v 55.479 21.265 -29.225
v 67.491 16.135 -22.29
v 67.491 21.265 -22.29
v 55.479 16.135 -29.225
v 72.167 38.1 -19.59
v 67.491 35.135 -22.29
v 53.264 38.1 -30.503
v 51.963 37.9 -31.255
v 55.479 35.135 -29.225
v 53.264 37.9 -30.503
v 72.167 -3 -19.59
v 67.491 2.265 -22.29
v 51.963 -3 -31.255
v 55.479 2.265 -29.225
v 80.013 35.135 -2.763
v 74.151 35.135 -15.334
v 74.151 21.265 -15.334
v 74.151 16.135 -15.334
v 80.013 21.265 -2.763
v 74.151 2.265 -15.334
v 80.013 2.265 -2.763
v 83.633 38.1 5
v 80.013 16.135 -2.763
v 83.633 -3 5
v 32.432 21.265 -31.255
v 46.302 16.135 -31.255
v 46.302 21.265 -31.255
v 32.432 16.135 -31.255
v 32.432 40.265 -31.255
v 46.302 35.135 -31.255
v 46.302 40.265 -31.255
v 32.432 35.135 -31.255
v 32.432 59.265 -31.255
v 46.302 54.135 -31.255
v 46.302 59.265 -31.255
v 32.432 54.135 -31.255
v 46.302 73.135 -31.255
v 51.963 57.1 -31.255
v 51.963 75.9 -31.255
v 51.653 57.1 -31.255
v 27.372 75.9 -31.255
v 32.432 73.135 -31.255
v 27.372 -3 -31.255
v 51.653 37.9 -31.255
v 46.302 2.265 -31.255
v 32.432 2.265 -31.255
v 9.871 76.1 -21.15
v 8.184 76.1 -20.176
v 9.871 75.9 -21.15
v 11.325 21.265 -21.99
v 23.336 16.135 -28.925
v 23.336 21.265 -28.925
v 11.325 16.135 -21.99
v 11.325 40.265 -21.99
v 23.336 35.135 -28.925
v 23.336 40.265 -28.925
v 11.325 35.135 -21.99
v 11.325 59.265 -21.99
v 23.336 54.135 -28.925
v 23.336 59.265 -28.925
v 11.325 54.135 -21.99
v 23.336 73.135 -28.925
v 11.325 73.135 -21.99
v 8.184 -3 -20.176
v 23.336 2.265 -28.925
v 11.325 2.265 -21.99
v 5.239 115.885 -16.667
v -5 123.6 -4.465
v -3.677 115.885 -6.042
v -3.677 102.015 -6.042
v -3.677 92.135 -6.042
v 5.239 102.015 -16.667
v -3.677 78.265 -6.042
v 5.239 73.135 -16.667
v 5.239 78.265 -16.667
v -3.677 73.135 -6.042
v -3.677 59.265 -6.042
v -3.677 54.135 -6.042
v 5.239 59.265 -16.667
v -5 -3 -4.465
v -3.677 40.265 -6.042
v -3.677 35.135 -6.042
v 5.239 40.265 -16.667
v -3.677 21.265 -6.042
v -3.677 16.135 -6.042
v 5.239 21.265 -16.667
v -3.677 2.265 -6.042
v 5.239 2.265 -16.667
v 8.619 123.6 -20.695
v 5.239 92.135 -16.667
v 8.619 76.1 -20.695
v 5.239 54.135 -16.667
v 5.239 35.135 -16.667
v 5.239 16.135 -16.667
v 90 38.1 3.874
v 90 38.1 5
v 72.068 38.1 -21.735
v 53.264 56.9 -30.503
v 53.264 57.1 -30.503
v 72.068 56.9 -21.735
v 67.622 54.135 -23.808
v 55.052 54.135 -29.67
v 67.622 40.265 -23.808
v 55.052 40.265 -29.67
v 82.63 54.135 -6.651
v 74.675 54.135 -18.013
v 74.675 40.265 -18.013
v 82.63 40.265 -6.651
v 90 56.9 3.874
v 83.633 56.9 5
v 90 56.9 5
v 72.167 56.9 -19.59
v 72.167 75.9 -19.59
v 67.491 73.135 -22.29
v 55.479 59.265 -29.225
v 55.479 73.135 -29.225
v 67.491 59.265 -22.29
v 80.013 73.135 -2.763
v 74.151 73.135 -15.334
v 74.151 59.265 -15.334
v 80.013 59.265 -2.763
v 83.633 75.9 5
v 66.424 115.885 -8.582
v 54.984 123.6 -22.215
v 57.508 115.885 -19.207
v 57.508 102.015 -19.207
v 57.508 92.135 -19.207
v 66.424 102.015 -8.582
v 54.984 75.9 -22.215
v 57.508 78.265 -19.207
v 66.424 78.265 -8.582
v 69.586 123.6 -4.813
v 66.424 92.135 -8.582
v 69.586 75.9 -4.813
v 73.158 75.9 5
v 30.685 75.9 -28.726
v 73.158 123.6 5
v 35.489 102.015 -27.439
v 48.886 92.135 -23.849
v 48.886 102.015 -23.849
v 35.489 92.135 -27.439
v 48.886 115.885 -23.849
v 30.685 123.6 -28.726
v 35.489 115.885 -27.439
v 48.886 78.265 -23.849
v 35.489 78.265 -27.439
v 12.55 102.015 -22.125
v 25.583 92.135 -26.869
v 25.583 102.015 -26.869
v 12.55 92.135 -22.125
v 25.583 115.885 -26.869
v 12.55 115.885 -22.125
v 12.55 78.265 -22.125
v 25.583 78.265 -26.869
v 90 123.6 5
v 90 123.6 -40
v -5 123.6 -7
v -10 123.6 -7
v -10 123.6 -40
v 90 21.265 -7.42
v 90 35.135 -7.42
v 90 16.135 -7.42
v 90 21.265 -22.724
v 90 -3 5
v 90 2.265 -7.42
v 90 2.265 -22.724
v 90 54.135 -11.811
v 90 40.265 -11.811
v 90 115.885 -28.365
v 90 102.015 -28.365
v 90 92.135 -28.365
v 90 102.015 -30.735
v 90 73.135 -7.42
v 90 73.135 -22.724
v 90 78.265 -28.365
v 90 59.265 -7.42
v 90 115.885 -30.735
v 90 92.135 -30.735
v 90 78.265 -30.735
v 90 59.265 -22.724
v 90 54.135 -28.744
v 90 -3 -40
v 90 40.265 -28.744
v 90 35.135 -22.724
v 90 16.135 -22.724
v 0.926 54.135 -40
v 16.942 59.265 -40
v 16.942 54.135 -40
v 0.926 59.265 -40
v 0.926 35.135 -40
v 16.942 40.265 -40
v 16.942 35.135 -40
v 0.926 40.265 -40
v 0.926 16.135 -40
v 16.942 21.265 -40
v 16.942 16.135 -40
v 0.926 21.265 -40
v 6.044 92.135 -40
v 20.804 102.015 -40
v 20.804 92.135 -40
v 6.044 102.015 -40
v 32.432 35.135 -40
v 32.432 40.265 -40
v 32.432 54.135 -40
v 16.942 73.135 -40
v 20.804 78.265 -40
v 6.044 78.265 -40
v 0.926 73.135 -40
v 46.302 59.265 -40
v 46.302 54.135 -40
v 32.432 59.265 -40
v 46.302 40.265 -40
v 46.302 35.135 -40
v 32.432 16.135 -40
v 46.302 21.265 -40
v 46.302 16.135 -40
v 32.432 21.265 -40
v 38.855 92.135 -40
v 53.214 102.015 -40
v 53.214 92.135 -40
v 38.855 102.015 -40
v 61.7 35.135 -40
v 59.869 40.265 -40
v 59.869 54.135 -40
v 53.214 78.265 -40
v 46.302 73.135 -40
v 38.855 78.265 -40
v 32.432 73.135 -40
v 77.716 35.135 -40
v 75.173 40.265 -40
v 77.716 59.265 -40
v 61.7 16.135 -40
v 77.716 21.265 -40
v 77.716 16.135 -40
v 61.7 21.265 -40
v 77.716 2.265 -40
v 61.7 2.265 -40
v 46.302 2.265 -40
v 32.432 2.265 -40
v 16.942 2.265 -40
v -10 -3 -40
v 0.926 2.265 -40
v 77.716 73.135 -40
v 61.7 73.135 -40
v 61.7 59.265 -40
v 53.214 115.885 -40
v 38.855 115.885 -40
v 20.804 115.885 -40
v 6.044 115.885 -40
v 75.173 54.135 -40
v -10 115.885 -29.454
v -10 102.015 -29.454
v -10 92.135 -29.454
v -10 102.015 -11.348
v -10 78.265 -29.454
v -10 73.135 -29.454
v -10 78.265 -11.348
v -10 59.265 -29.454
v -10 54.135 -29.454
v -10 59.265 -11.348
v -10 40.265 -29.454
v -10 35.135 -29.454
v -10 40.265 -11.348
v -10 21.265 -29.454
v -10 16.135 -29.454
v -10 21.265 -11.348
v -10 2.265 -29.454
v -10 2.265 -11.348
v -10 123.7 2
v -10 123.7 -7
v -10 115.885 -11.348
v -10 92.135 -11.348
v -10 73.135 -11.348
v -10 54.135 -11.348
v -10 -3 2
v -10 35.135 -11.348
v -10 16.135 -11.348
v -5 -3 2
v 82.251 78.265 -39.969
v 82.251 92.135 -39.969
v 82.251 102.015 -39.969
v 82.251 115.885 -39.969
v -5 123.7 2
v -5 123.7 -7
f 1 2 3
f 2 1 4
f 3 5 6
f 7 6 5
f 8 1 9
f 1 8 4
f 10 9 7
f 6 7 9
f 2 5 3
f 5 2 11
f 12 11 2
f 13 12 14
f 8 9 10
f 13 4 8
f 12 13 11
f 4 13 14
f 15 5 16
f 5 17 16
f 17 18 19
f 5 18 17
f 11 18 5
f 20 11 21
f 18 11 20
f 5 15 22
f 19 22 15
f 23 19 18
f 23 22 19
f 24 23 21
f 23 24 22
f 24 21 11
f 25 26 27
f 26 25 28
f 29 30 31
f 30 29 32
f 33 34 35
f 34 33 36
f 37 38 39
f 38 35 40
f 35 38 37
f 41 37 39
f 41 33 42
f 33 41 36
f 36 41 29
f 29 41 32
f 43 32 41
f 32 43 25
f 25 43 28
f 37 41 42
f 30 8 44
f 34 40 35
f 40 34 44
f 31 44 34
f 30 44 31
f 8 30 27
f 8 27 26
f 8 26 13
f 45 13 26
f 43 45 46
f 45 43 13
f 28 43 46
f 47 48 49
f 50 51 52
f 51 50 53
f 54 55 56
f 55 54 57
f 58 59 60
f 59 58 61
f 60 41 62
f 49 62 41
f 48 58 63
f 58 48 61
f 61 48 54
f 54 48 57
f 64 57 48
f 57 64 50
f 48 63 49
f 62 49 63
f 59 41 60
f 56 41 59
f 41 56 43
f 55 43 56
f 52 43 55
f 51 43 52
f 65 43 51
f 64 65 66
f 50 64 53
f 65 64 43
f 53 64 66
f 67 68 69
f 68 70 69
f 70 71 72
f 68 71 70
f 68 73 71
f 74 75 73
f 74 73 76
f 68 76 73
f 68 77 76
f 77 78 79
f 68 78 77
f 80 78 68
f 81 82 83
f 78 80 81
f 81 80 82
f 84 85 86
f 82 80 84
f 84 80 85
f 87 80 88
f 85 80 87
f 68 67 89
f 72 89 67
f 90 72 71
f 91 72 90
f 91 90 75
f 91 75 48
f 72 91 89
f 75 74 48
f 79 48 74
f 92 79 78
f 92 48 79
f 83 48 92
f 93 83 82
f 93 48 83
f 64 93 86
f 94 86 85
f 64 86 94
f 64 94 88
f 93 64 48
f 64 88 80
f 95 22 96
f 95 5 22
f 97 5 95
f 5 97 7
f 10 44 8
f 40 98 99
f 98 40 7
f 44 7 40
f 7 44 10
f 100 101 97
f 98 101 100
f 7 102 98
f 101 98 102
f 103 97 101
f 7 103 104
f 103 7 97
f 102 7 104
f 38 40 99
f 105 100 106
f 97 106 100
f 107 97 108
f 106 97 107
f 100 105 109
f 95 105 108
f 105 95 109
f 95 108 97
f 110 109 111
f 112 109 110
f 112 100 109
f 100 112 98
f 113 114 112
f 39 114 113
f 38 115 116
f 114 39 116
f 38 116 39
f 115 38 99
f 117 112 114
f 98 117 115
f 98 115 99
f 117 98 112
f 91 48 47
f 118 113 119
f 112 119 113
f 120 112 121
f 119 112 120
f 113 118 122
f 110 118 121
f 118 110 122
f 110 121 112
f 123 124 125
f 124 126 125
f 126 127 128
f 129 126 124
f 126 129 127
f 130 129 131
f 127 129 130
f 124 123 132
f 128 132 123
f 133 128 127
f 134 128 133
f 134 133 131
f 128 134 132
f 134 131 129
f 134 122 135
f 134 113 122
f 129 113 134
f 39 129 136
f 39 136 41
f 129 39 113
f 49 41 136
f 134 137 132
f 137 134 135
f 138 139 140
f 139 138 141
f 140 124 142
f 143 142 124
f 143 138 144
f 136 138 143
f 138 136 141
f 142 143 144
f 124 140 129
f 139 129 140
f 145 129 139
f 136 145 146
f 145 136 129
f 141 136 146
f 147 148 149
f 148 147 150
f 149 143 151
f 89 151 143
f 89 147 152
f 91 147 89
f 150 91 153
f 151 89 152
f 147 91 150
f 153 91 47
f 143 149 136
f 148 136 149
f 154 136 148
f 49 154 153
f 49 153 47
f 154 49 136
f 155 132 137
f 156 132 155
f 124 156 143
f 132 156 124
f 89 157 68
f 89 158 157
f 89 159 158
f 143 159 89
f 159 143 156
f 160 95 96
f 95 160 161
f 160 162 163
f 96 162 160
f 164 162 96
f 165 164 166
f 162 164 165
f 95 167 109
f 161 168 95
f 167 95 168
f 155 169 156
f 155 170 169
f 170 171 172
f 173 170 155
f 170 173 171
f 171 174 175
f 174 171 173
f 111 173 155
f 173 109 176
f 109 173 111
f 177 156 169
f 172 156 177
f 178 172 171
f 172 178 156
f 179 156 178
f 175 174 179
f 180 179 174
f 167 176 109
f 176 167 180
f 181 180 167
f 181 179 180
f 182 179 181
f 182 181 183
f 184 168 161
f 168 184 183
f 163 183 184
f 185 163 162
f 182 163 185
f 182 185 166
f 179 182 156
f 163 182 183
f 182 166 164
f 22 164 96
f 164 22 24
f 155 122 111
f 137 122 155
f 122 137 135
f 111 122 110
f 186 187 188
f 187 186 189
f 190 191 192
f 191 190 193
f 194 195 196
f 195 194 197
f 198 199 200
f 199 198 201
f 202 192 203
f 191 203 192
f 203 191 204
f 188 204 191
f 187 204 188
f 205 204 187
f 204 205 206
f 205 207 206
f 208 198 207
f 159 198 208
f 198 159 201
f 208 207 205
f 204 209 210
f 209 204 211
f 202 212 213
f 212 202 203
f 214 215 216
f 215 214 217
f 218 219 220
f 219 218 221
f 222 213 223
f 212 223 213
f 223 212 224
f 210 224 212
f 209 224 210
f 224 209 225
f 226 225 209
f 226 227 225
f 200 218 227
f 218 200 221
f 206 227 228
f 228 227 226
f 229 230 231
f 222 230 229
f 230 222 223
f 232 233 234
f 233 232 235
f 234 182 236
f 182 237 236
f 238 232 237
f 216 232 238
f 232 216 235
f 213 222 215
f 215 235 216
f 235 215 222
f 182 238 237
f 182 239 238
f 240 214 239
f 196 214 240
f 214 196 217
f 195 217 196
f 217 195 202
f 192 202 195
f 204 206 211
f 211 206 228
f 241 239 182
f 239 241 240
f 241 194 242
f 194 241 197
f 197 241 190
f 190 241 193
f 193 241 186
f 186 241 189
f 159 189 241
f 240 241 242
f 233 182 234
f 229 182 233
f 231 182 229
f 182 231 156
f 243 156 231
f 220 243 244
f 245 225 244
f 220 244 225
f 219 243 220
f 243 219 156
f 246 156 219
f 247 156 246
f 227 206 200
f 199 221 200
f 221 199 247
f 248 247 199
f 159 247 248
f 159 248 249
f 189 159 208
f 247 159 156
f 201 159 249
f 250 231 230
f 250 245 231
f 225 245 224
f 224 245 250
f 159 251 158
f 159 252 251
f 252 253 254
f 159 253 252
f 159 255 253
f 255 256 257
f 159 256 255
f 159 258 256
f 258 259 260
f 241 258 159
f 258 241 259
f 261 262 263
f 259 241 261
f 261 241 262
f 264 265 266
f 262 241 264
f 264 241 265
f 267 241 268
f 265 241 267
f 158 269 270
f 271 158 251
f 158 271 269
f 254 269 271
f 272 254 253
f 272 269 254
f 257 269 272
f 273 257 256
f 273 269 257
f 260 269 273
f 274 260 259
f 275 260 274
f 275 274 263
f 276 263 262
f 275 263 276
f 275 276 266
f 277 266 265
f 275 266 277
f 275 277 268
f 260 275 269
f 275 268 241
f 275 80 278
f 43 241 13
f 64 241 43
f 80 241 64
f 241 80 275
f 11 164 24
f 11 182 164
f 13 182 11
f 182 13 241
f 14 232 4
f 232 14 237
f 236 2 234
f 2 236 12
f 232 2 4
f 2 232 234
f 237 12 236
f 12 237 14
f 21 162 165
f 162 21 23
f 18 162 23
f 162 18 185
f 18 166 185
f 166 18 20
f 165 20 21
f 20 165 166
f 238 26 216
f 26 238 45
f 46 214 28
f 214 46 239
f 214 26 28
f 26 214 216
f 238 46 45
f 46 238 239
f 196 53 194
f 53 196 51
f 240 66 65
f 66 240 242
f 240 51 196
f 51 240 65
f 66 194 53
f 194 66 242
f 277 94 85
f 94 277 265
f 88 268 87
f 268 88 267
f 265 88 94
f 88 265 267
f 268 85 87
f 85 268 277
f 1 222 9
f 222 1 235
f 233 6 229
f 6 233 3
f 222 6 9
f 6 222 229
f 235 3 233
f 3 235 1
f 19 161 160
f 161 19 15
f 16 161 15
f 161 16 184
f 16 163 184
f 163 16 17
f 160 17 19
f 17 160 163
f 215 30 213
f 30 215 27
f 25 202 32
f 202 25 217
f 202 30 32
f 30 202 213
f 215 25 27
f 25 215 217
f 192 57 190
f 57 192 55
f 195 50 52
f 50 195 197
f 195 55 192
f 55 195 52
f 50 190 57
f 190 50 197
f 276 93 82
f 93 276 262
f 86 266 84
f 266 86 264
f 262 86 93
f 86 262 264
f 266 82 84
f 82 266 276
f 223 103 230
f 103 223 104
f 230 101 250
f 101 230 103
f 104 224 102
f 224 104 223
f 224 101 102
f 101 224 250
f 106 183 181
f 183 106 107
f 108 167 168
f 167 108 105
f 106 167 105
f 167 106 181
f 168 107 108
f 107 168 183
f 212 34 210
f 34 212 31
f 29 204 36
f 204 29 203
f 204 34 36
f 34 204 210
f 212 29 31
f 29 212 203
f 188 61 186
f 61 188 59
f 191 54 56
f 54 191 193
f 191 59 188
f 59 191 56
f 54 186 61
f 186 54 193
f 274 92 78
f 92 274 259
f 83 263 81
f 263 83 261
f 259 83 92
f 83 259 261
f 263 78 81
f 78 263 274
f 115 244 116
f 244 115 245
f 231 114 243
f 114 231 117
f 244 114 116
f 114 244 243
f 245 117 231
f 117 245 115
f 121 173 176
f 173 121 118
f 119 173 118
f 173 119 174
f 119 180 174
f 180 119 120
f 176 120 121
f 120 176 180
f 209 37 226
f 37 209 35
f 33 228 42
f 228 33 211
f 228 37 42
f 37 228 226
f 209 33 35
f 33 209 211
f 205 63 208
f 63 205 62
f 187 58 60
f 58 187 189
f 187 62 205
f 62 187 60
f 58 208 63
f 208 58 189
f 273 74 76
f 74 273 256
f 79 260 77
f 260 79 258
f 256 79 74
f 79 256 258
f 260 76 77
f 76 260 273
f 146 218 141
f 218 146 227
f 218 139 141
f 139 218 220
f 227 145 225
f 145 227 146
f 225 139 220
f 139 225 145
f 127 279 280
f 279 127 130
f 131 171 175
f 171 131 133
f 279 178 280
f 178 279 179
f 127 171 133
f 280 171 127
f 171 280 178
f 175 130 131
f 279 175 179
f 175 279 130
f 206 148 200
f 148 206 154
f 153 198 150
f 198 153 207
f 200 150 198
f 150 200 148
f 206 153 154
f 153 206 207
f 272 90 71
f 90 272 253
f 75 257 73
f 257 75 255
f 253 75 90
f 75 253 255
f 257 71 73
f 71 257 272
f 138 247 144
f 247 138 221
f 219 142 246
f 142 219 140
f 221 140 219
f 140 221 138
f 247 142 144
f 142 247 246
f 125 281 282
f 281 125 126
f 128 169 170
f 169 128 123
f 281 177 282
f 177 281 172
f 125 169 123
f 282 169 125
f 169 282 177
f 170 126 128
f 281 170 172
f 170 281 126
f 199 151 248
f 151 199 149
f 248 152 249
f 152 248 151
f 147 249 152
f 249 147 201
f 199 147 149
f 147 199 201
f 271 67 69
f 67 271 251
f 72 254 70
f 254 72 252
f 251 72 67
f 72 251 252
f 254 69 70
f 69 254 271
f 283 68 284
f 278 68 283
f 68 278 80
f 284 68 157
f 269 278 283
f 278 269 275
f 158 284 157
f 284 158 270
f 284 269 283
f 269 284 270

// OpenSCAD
// file: column.scad
include <common.scad>;


module column_var_size(type, angles, offsets_x, offsets_z, width, enabled) {
    if (enabled[0]) {
        key(angles[0], type, width);
        if (enabled[1]) translate([SINGLE * cos(angles[0]) + offsets_x[0], 0, -SINGLE * sin(angles[0]) + offsets_z[0]]) {
            key(angles[1], type, width);
            if (enabled[2]) translate([SINGLE * cos(angles[1]) + offsets_x[1], 0, -SINGLE * sin(angles[1]) + offsets_z[1]]) {
                key(angles[2], type, width);
                if (enabled[3]) translate([SINGLE * cos(angles[2]) + offsets_x[2], 0, -SINGLE * sin(angles[2]) + offsets_z[2]]) {
                    key(angles[3], type, width);
                    if (enabled[4]) translate([SINGLE * cos(angles[3]) + offsets_x[3], 0, -SINGLE * sin(angles[3]) + offsets_z[3]]) {
                        key(angles[4], type, width);
                    }
                }
            }
        }
    }
}


module column5(type, angles, offsets_x, offsets_z, width=SINGLE) {
    column_var_size(type, angles, offsets_x, offsets_z, width, [true, true, true, true, true]);
}


module column4(type, angles, offsets_x, offsets_z, width=SINGLE) {
    column_var_size(type, angles, offsets_x, offsets_z, width, [true, true, true, true, false]);
}


module column3(type, angles, offsets_x, offsets_z, width=SINGLE) {
    column_var_size(type, angles, offsets_x, offsets_z, width, [true, true, true, false, false]);
}
// file: keycaps/dsa.scad
include <../common.scad>


// DSA keycap top width.
DSA_TOP_WIDTH = 12.7;
// DSA keycap height.
DSA_HEIGHT = 7.4;

USE_SIMPLIFIED_KEYS = true;


module key_base(type, width, is_simplified=USE_SIMPLIFIED_KEYS) {
    if (type == 0) {
        // A simple way to produce 1.5 and double horizontal keys.
        resize([KEY_WIDTH, KEY_WIDTH * width / SINGLE, DSA_HEIGHT]) {
            // Simplified geometry is much faster to render.
            if (is_simplified) {
                WN_OFFSET = (KEY_WIDTH - DSA_TOP_WIDTH) / 2;
                // Draw a keycap as a big bottom and a smaller top squares
                // connected by 4 side faces.
                // TODO: why do we use this translation?
                translate([WN_OFFSET, WN_OFFSET, 0]) {
                    // cube([DSA_TOP_WIDTH, DSA_TOP_WIDTH, DSA_HEIGHT]);
                    polyhedron(
                        points=[
                            // Bottom
                            [0, 0, 0],
                            [KEY_WIDTH, 0, 0],
                            [KEY_WIDTH, KEY_WIDTH, 0],
                            [0, KEY_WIDTH, 0],
                            // Top
                            [WN_OFFSET, WN_OFFSET, DSA_HEIGHT],
                            [WN_OFFSET + DSA_TOP_WIDTH, WN_OFFSET, DSA_HEIGHT],
                            [WN_OFFSET + DSA_TOP_WIDTH, WN_OFFSET + DSA_TOP_WIDTH, DSA_HEIGHT],
                            [WN_OFFSET, WN_OFFSET + DSA_TOP_WIDTH, DSA_HEIGHT],
                        ],
                        faces=[
                            // Bottom
                            [0, 1, 2],
                            [2, 3, 0],
                            // Top
                            [5, 4, 6],
                            [6, 4, 7],
                            // Sides
                            [0, 4, 1],
                            [4, 5, 1],
                            [1, 5, 2],
                            [5, 6, 2],
                            [2, 6, 3],
                            [6, 7, 3],
                            [3, 7, 0],
                            [7, 4, 0]
                        ]
                    );
                }
            }
            else {
                KEYCAP_OFFSET = -1;
                translate([KEY_WIDTH / 2, KEY_WIDTH / 2, KEYCAP_OFFSET]) {
                    import("./keycaps/mx_dsa.stl");
                }
            }
        }
    } else if (type == 1) {
        // We use a hack for 3D cases construction: each key leaves a block
        // just behind itself that formes a support for it. The union
        // of blocks for keys can be than intersected with a cube in order
        // to shape the case block.
        CASE_EXTRUSION_DEPTH = 200;
        // TODO: comment and clean.
        translate([-KEY_WIDTH, -0.1, -CASE_EXTRUSION_DEPTH - KEYCAP_TO_PLATE_OFFSET]) {
            cube([4 * KEY_WIDTH, width + 0.2, CASE_EXTRUSION_DEPTH]);
        }
    } else if (type == 2) {
        // If key is bigger than single, the additional key size should be
        // split in two and added to the left and to the right of the hole.
        // This code works correctly only with horizontal keys.
        translate([0, (width - SINGLE) / 2, 0]) {
            // The standard offset between a single keycap contour and the
            // corresponding hole.
            HOLE_OFFSET = (KEY_WIDTH - HOLE_SIZE) / 2;
            // How deep the hole should be cut? It may be necessary
            // to increase this parameter for more bulky keyboard cases.
            HOLE_HEIGHT = 40;
            // We move the hole by 1 mm above the requested position in order
            // to avoid non noded geometries intersections.
            translate([HOLE_OFFSET, HOLE_OFFSET, -HOLE_HEIGHT + 1]) {
                cube([HOLE_SIZE, HOLE_SIZE, HOLE_HEIGHT]);
            }
        }
    }
}


module key(angle, type, width) {
    rotate(angle, [0, 1, 0]) key_base(type, width);
}
// file: common.scad
// Standard keycap size unit.
KEY_WIDTH = 18.4;
KEYCAP_TO_PLATE_OFFSET = 6.7;

// Standard spacing between keys.
SINGLE = 19;
SINGLE_AND_HALF = SINGLE * 1.5;
DOUBLE = SINGLE * 2;

// Cherry MX hole width.
STANDARD_HOLE_SIZE = 13.97;
// Adjusted hole width for tighter keys fit.
HOLE_SIZE_ADJUSTMENT = -0.1;
HOLE_SIZE = STANDARD_HOLE_SIZE + HOLE_SIZE_ADJUSTMENT;
// main file
include <common.scad>;
include <keycaps/dsa.scad>;
include <column.scad>;


module keyboard(with_keys=false) {
    angles = [
        [50, 30, 0, -30, -65],
        [50, 30, 0, -30, -65],
        [50, 30, 0, -25, -55],
        [50, 30, 0, -30, -65],
        [50, 20, -15, -50, -70],
        [50, 20, -15, -50, -70]
    ];
    offsets_x = [0.5, 1, 1, 0.5];
    offsets_z = [-0.5, 0, 0, 0.5];

    translate([0, 0, 0]) {
        translate([-10, -3, -7]) cube([5, 126.7, 9]);
        difference() {
            intersection() {
                translate([-10, -3, -40]) cube([100, 130, 45]);
                union() {
                    for (i = [0:4]) {
                        translate([0, SINGLE * i, 0]) column5(1, angles[i], offsets_x, offsets_z);
                    }
                    translate([0, SINGLE * 5, 0]) column5(1, angles[5], offsets_x, offsets_z, SINGLE_AND_HALF);
                    translate([0, -3, 0]) column5(1, angles[0], offsets_x, offsets_z);
                }
            }
            union() {
                for (i = [0:3]) {
                    translate([0, SINGLE * i, 0]) column5(2, angles[i], offsets_x, offsets_z);
                }
                translate([0, SINGLE * 4, 0]) column4(2, angles[4], offsets_x, offsets_z, SINGLE);
                translate([0, SINGLE * 5, 0]) column4(2, angles[5], offsets_x, offsets_z, SINGLE_AND_HALF);
            }
        }

        if (with_keys) {
            for (i = [0:3]) {
                translate([0, SINGLE * i, 0]) column5(0, angles[i], offsets_x, offsets_z);
            }
            translate([0, SINGLE * 4, 0]) column4(0, angles[4], offsets_x, offsets_z, SINGLE);
            translate([0, SINGLE * 5, 0]) column4(0, angles[5], offsets_x, offsets_z, SINGLE_AND_HALF);
        }
    }
}


keyboard(false);
